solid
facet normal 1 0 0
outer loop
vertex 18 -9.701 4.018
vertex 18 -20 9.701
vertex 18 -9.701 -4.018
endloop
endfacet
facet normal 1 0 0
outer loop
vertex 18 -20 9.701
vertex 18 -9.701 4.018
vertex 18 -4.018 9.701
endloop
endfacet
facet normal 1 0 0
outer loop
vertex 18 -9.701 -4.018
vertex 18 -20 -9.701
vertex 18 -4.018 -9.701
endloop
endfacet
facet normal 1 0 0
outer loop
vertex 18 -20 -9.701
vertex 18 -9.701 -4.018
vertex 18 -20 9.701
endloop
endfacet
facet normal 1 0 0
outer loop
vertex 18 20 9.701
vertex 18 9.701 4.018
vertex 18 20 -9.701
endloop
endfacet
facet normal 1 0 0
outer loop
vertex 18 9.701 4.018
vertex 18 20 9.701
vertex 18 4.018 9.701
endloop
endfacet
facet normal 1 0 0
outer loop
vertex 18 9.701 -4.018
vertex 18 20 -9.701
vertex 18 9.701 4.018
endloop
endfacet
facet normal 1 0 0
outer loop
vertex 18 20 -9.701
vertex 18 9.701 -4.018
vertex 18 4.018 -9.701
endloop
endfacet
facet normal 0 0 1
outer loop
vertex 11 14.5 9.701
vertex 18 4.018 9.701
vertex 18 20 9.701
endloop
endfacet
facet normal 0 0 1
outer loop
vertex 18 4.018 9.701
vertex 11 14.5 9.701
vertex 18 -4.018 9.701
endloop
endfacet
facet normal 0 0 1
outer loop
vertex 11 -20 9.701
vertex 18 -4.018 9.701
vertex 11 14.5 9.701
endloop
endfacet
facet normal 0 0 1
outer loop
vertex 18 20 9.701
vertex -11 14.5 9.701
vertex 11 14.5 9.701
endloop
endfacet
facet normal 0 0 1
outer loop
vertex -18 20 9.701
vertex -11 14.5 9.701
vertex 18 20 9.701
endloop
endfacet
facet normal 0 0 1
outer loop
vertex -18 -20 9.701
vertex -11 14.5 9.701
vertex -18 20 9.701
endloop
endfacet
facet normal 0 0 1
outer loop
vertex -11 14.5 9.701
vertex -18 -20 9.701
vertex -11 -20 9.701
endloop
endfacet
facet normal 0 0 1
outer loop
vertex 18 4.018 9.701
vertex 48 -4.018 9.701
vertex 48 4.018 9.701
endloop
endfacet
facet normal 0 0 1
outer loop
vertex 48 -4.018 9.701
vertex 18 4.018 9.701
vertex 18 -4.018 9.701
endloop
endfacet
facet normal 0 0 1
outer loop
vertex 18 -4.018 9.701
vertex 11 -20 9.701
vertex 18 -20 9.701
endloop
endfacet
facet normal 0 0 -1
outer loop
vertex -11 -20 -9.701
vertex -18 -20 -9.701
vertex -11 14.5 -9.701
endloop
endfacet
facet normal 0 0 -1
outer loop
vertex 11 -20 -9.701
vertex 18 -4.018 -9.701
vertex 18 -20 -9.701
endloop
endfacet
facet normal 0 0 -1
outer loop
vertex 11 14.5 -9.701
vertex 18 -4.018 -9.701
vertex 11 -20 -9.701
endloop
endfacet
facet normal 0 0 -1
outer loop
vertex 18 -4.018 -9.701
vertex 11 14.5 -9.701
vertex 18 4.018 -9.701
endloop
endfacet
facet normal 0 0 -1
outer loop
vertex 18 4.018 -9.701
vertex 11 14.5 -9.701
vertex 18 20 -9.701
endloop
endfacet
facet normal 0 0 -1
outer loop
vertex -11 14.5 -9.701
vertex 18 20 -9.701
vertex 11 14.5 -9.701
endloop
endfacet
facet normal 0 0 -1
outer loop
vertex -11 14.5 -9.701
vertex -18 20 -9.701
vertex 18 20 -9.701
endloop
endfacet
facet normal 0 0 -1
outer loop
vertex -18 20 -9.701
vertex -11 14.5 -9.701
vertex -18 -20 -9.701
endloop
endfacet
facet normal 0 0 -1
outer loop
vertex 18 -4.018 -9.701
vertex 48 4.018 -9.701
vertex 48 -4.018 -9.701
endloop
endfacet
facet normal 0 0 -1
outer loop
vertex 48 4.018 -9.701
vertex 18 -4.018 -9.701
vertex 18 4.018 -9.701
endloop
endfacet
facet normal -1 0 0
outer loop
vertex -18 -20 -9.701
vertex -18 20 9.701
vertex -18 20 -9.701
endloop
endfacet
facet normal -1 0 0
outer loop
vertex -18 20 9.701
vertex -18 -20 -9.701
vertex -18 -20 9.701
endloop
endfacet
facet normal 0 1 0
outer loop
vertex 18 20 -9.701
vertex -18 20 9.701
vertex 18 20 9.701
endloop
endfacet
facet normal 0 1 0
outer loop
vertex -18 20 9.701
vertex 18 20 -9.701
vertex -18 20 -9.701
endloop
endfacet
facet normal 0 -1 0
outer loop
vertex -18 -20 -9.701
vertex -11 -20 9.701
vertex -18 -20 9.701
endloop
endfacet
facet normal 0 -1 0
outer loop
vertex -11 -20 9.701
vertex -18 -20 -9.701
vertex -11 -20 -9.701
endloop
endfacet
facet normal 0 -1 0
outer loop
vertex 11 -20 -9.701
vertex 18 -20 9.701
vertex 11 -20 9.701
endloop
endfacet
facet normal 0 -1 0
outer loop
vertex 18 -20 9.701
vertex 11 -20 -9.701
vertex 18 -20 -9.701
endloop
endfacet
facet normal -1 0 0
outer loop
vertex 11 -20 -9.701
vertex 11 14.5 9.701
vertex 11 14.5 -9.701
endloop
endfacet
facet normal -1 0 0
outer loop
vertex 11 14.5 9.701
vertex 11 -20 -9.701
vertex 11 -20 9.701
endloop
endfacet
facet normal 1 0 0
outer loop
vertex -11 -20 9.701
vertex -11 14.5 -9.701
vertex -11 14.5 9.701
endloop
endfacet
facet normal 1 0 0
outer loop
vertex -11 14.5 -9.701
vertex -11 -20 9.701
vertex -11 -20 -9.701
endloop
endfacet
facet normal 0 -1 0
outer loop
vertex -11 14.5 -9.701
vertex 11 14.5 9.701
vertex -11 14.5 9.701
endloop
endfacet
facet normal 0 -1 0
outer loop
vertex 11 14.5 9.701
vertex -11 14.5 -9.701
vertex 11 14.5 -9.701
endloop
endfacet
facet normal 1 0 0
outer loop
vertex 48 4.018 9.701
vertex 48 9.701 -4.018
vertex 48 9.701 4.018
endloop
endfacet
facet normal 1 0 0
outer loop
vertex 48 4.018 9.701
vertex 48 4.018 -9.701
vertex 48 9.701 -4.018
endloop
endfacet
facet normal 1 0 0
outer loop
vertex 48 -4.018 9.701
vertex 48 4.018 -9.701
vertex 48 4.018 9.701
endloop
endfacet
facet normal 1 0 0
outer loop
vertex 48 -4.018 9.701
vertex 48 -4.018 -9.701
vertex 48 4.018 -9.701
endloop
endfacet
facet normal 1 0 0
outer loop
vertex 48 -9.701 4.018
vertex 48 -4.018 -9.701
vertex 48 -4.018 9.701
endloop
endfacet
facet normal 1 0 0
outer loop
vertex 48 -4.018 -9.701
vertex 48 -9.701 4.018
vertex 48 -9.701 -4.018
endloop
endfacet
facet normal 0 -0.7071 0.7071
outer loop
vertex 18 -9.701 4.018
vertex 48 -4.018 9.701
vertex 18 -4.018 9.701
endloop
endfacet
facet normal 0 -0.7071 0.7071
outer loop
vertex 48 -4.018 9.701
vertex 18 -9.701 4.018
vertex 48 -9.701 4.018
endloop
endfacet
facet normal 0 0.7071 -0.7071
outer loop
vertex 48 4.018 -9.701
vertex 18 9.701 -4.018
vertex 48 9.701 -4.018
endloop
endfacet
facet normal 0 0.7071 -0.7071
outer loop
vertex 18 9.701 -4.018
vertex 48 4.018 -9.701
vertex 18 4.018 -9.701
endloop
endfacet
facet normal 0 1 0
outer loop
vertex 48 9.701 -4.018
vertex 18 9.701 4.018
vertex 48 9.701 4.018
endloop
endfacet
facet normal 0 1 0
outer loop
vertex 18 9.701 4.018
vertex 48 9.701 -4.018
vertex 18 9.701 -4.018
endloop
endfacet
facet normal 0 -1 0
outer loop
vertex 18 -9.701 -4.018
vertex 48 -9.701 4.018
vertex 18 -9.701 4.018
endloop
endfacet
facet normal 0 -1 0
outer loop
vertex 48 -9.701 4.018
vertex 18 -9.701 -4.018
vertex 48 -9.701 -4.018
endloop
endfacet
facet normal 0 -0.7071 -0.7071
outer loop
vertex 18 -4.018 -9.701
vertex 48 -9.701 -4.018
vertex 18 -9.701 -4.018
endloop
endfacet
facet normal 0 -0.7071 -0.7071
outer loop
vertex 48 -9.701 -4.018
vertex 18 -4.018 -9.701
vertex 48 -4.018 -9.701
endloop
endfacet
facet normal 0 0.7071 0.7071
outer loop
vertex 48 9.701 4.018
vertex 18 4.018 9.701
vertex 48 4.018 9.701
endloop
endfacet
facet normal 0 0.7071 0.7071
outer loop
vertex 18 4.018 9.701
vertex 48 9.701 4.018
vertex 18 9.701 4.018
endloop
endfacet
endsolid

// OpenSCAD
pipedia = 13.8;
pvc3_4 = 10.5;//1/2 of 19mm = 9.5
pvclength = 30;//95;// 4 in max = 101.6mm
angle = 67.5;
side =  (2*pvc3_4)*cos(angle);//c cos(t)
ta = 2*(pvc3_4/tan(angle));
x = side/(sqrt(2));
blue = 2*x+side;
rotate([22.5,0,0])
rotate([0,90,0])
translate([0,0,18])
cylinder(h = pvclength, r1=pvc3_4, r2 = pvc3_4, $fn=8);
difference(){
cube([36, 40,blue], center=true);//(2*pvc3_4)-2//ta//side
translate([0,-3,0]){
cube([22, 35, 22], center=true);}; 
}

//translate([0,0,-15])attach();

module myhull(h=8, r=70, mangl=15){
  difference(){
  hull(){
    cylinder(h = h, r1=r, r2 = r, $fn=3);
    rotate([0,0,15]){
       cylinder(h = h, r1 = (r-2), r2 =  (r-2), $fn=3);};
    rotate([0,0,-15]){
      cylinder(h = h, r1 = (r-2), r2 = (r-2), $fn=3);};
    rotate([0,0,-7]){
      cylinder(h = h, r1 = r, r2 = r, $fn=3);};
    rotate([0,0,7]){
      cylinder(h = h, r1 = r, r2 = r, $fn=3);};
      };
    };
};

attachoff = 3.5;

module attach(){
translate([45,0,pipedia+attachoff]){
  rotate([0,90,0]){
    outerdiameter = (pipedia+2);
    supportradius = pipedia+2;//1.9;
    screwzoff = pipedia+2.5;
    difference(){
      union(){
      cylinder(h = 20, r1 = (pipedia+2), r2 = (pipedia+2));
        translate([-1.5,-supportradius,0]){
        cube([17,(2*supportradius),4]);//cube([17,30.8,4]);//, center=true);
        };
        translate([-1.5,-supportradius,16]){
        cube([17,(2*supportradius),4]);//30.8,4]);//, center=true);
        };
        rotate([0,0,90]){
        translate([0,screwzoff,10]){
        cube([10,10,10], center=true);
        };
      };
  };
  rotate([0,0,90]){
      cylinder(h = 20, r1 = pipedia, r2 = pipedia);
     translate([0,25,10]){
     rotate([90,0,0]){
     cylinder(h=25, r1 =screwsize, r2= screwsize);
     };
   };
 };
    };
  };

};
}
